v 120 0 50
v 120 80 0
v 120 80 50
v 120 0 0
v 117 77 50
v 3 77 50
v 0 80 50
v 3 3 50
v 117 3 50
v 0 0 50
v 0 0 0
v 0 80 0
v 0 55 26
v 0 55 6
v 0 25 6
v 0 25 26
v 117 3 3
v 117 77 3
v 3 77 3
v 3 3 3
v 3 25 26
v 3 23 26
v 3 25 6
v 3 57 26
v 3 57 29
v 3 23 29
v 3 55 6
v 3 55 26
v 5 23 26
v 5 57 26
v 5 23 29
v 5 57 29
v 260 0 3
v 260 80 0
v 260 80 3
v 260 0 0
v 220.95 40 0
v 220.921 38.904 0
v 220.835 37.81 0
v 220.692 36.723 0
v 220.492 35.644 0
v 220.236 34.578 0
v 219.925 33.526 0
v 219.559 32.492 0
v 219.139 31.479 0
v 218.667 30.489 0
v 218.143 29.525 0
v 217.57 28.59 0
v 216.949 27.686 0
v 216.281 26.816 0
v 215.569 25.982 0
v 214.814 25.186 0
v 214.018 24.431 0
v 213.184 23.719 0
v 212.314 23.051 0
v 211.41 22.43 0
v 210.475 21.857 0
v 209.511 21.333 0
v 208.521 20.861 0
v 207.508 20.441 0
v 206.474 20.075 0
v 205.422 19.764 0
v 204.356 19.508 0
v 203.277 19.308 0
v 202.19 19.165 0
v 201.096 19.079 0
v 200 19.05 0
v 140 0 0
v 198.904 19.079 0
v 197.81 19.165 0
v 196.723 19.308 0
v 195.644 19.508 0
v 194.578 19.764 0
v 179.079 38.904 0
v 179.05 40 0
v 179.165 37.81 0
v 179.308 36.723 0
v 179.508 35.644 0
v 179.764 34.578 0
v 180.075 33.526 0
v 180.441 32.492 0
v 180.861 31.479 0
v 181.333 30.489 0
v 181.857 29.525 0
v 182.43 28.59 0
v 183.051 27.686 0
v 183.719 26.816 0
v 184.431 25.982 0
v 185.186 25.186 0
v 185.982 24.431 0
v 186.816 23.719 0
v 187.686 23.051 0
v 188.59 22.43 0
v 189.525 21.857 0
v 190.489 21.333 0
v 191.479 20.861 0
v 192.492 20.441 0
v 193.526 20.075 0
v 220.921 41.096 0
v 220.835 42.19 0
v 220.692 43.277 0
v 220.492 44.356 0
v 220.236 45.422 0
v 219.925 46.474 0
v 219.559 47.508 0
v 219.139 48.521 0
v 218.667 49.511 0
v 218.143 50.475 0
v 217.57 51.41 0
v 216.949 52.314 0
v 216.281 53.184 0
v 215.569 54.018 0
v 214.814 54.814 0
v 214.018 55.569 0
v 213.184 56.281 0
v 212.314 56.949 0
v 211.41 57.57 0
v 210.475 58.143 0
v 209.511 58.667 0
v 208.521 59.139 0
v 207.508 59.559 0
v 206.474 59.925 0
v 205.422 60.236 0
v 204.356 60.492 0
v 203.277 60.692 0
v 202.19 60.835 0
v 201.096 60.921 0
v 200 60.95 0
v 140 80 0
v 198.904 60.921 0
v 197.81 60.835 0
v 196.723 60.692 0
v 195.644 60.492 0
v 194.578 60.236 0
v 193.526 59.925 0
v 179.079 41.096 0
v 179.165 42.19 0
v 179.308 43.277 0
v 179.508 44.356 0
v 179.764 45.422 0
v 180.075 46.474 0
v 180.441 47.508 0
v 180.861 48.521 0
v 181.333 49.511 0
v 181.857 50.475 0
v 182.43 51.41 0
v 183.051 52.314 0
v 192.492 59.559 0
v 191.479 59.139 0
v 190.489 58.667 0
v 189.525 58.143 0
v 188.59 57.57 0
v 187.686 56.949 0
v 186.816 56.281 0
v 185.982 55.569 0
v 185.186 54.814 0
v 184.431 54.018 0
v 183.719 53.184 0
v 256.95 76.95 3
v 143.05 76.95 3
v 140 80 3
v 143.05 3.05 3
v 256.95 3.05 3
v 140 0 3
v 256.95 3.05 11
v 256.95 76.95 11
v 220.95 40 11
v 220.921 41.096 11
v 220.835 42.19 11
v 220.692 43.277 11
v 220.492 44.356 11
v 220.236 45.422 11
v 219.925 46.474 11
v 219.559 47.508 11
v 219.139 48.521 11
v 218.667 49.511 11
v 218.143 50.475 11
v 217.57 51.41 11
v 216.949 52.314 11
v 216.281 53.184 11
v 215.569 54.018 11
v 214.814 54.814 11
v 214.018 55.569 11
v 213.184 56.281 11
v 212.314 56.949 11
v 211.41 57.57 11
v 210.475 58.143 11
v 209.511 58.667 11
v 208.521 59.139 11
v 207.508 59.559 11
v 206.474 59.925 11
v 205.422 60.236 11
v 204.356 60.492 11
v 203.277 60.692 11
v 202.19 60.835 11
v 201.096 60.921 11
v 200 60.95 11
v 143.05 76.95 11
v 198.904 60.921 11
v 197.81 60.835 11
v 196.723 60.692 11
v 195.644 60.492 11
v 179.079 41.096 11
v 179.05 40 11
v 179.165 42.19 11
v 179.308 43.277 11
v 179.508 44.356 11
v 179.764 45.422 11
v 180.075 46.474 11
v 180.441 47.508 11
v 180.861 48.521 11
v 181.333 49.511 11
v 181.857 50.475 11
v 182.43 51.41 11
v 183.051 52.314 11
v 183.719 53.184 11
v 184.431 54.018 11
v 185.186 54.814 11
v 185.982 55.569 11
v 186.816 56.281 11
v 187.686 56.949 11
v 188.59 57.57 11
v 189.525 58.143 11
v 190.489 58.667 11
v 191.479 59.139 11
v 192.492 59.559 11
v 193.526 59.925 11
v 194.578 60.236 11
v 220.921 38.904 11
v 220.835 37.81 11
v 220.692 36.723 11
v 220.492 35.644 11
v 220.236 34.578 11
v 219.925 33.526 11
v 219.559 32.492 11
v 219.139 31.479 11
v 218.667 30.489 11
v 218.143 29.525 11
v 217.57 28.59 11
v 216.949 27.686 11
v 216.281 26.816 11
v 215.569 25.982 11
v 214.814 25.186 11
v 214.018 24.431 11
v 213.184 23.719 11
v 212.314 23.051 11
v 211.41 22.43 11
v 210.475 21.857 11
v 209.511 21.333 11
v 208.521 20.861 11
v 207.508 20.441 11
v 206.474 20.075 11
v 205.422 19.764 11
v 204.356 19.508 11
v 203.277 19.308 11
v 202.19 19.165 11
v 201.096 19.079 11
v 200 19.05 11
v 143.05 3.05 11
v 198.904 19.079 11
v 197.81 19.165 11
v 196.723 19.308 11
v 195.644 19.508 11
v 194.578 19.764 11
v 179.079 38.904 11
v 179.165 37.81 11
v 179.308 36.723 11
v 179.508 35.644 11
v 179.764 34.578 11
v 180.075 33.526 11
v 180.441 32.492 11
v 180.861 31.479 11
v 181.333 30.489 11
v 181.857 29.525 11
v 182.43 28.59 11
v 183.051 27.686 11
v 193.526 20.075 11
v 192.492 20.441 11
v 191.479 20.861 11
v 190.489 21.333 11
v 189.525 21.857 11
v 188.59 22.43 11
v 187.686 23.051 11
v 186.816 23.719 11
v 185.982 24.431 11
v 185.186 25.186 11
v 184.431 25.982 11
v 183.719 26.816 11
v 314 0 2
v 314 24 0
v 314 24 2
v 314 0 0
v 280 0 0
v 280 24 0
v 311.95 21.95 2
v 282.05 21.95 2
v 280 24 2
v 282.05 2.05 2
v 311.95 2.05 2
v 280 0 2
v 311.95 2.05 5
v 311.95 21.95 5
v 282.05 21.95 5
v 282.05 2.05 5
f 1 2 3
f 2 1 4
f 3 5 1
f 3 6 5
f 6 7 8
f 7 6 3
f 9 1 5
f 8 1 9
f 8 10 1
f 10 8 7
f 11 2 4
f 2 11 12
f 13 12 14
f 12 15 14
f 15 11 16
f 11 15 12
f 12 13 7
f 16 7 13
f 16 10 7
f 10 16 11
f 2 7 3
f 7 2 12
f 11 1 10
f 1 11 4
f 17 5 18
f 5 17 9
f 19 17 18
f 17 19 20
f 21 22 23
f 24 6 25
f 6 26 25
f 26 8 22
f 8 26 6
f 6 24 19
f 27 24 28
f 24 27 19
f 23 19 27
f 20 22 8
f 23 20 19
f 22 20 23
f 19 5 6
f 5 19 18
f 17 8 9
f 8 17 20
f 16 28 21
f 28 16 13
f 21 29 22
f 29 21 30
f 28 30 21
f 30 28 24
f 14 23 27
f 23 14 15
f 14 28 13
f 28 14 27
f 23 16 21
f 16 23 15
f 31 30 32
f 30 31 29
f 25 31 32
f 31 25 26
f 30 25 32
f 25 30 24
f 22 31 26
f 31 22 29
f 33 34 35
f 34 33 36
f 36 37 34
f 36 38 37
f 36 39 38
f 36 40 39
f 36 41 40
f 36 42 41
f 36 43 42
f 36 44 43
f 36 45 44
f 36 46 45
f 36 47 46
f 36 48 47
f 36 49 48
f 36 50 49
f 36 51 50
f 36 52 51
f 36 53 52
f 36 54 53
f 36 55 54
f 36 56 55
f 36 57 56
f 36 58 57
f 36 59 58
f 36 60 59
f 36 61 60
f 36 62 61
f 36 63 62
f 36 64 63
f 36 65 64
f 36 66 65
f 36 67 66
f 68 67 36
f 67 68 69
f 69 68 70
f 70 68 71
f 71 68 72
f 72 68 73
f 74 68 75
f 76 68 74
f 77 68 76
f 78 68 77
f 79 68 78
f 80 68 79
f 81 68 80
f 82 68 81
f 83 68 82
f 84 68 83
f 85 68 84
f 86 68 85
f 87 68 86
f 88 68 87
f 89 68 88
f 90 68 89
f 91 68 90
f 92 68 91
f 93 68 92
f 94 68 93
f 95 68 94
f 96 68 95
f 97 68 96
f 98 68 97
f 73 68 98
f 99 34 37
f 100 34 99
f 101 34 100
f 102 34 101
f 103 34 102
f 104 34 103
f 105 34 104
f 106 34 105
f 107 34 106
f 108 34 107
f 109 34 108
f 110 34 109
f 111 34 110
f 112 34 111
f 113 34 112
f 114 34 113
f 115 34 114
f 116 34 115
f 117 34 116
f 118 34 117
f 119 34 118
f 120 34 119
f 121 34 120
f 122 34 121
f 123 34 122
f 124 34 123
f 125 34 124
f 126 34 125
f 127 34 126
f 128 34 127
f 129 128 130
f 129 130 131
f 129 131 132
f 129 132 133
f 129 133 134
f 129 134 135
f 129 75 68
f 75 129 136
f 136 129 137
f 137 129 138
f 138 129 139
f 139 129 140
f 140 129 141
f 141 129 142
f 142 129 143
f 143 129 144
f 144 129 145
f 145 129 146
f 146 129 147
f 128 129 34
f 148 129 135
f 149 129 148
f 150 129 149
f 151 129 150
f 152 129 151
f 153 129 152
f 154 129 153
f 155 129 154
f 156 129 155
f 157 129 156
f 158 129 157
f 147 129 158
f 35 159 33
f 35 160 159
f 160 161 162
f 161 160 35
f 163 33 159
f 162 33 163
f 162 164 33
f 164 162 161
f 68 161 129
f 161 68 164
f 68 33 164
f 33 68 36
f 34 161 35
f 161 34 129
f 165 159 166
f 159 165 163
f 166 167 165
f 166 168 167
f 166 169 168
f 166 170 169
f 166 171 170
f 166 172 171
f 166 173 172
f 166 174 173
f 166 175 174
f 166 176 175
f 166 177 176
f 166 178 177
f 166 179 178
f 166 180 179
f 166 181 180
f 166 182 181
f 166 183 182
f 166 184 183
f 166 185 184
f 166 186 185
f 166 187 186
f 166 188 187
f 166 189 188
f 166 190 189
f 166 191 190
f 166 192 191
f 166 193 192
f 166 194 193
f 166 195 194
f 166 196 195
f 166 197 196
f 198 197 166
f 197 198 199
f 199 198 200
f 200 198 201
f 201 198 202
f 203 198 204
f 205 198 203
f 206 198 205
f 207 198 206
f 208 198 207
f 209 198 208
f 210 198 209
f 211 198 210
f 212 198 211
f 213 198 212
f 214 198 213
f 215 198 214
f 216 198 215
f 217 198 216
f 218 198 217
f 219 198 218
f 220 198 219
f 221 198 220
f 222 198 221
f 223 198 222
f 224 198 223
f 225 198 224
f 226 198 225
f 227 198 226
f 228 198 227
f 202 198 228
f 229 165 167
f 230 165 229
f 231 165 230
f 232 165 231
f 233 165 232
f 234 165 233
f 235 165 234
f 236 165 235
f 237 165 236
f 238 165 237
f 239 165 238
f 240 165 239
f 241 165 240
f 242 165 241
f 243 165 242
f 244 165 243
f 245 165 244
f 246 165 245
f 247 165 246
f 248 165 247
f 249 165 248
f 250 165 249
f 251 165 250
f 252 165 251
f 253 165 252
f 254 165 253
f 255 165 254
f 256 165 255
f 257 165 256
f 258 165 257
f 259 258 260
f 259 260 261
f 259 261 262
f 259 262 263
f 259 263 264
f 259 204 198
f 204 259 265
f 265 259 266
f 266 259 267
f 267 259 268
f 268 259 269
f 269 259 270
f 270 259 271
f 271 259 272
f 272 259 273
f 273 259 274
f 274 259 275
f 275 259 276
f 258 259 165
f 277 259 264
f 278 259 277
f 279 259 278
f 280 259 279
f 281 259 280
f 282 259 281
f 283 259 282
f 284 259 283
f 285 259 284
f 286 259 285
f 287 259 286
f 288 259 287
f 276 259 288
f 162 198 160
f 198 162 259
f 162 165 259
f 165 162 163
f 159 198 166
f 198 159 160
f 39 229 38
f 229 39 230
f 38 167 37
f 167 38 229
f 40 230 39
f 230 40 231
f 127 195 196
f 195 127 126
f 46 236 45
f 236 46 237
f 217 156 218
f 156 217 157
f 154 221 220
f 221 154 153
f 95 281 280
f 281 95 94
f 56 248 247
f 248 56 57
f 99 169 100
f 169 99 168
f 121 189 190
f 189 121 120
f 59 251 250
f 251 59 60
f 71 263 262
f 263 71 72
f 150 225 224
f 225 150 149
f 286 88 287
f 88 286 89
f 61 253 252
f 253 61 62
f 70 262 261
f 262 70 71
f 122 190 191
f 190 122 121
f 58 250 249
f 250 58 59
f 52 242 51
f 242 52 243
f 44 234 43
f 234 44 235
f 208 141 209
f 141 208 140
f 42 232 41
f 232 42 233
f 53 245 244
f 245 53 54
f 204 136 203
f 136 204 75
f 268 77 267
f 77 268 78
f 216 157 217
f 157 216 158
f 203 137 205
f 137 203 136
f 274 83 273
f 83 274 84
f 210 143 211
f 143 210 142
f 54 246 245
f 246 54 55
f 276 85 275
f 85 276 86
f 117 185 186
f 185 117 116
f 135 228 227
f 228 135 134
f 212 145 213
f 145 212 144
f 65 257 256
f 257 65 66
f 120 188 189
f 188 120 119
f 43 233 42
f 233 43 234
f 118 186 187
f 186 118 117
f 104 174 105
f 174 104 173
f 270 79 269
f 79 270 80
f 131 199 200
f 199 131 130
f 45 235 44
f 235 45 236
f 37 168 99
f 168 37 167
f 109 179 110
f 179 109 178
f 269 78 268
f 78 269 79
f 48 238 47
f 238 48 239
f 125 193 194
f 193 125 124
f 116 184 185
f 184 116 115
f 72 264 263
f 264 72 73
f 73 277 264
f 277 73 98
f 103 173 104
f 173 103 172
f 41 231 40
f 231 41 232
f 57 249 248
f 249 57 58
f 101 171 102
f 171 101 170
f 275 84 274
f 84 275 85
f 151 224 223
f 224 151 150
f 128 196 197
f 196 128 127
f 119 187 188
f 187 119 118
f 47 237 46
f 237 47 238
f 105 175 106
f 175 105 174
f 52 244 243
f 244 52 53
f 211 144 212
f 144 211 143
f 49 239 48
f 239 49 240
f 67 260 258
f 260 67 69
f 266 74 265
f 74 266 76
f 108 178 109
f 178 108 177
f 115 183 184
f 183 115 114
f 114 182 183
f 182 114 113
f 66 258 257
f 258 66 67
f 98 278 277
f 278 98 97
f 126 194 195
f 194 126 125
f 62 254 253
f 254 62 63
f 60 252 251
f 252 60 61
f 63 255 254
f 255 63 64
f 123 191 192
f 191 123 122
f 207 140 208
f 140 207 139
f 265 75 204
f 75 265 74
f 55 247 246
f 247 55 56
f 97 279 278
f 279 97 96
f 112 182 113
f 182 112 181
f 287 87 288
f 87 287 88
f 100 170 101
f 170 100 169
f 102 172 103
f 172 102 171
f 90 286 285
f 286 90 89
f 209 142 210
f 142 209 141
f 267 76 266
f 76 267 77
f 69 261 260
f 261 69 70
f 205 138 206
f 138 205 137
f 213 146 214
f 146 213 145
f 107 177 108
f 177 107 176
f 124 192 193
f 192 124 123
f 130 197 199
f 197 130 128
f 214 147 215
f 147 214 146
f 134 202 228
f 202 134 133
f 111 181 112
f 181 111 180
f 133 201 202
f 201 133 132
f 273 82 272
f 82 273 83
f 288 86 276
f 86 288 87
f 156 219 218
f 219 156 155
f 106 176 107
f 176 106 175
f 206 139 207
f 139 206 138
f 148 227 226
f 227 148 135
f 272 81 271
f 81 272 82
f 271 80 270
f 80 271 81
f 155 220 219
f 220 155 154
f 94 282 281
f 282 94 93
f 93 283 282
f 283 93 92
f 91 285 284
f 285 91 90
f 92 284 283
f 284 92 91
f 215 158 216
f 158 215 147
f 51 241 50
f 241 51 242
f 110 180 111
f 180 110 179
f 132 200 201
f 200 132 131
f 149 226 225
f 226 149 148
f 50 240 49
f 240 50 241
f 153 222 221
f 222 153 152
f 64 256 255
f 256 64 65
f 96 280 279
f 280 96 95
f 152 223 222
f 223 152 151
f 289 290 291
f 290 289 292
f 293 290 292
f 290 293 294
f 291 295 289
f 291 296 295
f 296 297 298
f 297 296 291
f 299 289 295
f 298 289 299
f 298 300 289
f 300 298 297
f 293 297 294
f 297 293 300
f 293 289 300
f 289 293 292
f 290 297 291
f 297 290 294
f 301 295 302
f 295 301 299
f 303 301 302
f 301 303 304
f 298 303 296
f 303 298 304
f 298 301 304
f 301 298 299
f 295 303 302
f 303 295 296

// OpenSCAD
//
// ======================================================
// CAIXA DA ESTAÇÃO METEOROLÓGICA E SUAS DUAS TAMPAS
// Folga lateral: 0,05 mm por lado
// ======================================================

$fn = 120;

// ------------------------
// PARÂMETROS GERAIS
// ------------------------

folga_lateral = 0.05;

// Dimensões externas da caixa associada
comprimento_caixa = 120;
largura_caixa = 80;
altura_caixa = 50;
parede_caixa = 3;

// Abertura menor da caixa
porta_largura = 30;
porta_altura = 20;
altura_inicio_porta = 6;

// Distância entre as peças na mesa de impressão
espacamento = 20;

// ======================================================
// PARTE 1 - TAMPA PRINCIPAL
// ======================================================

// ------------------------
// PARÂMETROS DA TAMPA PRINCIPAL
// ------------------------

comprimento_tampa = comprimento_caixa;
largura_tampa = largura_caixa;
espessura_tampa = 3;

// Aba que entra no vão interno da caixa.
// Vão interno: 114 mm x 74 mm.
// Com 0,05 mm de folga por lado: 113,9 mm x 73,9 mm.
comprimento_aba = comprimento_caixa - 2*parede_caixa - 2*folga_lateral;
largura_aba = largura_caixa - 2*parede_caixa - 2*folga_lateral;
profundidade_aba = 8;

diametro_furo = 41.9;
raio_furo = diametro_furo/2;

// Posições
aba_x = (comprimento_tampa - comprimento_aba)/2;
aba_y = (largura_tampa - largura_aba)/2;

centro_x = comprimento_tampa/2;
centro_y = largura_tampa/2;

// ------------------------
// MÓDULO TAMPA PRINCIPAL
// ------------------------

module tampa_principal()
{
    difference()
    {
        union()
        {
            // Tampa externa
            cube([
                comprimento_tampa,
                largura_tampa,
                espessura_tampa
            ]);

            // Aba de encaixe
            translate([
                aba_x,
                aba_y,
                -profundidade_aba
            ])
            cube([
                comprimento_aba,
                largura_aba,
                profundidade_aba
            ]);
        }

        // Furo central
        translate([
            centro_x,
            centro_y,
            -profundidade_aba-1
        ])
        cylinder(
            h=profundidade_aba+espessura_tampa+2,
            r=raio_furo
        );
    }
}

// ======================================================
// PARTE 2 - TAMPA MENOR DA ABERTURA LATERAL
// ======================================================

// ------------------------
// PARÂMETROS DA TAMPA MENOR
// ------------------------

// Aba externa da tampa menor: sobra de 2 mm em cada lado da abertura.
// Abertura: 30 mm x 20 mm.
// Tampa externa: 34 mm x 24 mm.
tampa_menor_aba_externa = 2;
tampa_menor_largura = porta_largura + 2*tampa_menor_aba_externa;
tampa_menor_altura = porta_altura + 2*tampa_menor_aba_externa;
tampa_menor_espessura = 2;

// Aba que entra no buraco menor da caixa.
// Abertura: 30 mm x 20 mm.
// Com 0,05 mm de folga por lado: 29,9 mm x 19,9 mm.
tampa_menor_profundidade_aba = parede_caixa;
tampa_menor_aba_largura = porta_largura - 2*folga_lateral;
tampa_menor_aba_altura = porta_altura - 2*folga_lateral;

// ------------------------
// MÓDULO TAMPA MENOR
// ------------------------

module tampa_menor()
{
    union()
    {
        // Tampa externa
        cube([
            tampa_menor_largura,
            tampa_menor_altura,
            tampa_menor_espessura
        ]);

        // Aba de encaixe
        translate([
            (tampa_menor_largura - tampa_menor_aba_largura)/2,
            (tampa_menor_altura - tampa_menor_aba_altura)/2,
            -tampa_menor_profundidade_aba
        ])
        cube([
            tampa_menor_aba_largura,
            tampa_menor_aba_altura,
            tampa_menor_profundidade_aba
        ]);
    }
}

// ======================================================
// CORPO DA CAIXA
// ======================================================

module caixa() {

    difference() {

        // Corpo externo
        cube([comprimento_caixa, largura_caixa, altura_caixa]);

        // Interior oco
        translate([parede_caixa, parede_caixa, parede_caixa])
            cube([
                comprimento_caixa - 2*parede_caixa,
                largura_caixa - 2*parede_caixa,
                altura_caixa
            ]);

        // Abertura da portinha
        translate([
            -1,
            (largura_caixa - porta_largura)/2,
            altura_inicio_porta
        ])
        cube([
            parede_caixa + 2,
            porta_largura,
            porta_altura
        ]);
    }

    // Beiral anti-chuva
    translate([
        0,
        (largura_caixa - porta_largura)/2 - 2,
        altura_inicio_porta + porta_altura
    ])
    cube([
        5,
        porta_largura + 4,
        3
    ]);
}

// ======================================================
// DISPOSIÇÃO PARA IMPRESSÃO
// Todas as peças ficam com a base em Z = 0.
// As tampas ficam com as abas de encaixe voltadas para cima.
// ======================================================

caixa();

translate([
    comprimento_caixa + espacamento,
    largura_tampa,
    espessura_tampa
])
    rotate([180, 0, 0])
        tampa_principal();

translate([
    comprimento_caixa + comprimento_tampa + 2*espacamento,
    tampa_menor_altura,
    tampa_menor_espessura
])
    rotate([180, 0, 0])
        tampa_menor();
